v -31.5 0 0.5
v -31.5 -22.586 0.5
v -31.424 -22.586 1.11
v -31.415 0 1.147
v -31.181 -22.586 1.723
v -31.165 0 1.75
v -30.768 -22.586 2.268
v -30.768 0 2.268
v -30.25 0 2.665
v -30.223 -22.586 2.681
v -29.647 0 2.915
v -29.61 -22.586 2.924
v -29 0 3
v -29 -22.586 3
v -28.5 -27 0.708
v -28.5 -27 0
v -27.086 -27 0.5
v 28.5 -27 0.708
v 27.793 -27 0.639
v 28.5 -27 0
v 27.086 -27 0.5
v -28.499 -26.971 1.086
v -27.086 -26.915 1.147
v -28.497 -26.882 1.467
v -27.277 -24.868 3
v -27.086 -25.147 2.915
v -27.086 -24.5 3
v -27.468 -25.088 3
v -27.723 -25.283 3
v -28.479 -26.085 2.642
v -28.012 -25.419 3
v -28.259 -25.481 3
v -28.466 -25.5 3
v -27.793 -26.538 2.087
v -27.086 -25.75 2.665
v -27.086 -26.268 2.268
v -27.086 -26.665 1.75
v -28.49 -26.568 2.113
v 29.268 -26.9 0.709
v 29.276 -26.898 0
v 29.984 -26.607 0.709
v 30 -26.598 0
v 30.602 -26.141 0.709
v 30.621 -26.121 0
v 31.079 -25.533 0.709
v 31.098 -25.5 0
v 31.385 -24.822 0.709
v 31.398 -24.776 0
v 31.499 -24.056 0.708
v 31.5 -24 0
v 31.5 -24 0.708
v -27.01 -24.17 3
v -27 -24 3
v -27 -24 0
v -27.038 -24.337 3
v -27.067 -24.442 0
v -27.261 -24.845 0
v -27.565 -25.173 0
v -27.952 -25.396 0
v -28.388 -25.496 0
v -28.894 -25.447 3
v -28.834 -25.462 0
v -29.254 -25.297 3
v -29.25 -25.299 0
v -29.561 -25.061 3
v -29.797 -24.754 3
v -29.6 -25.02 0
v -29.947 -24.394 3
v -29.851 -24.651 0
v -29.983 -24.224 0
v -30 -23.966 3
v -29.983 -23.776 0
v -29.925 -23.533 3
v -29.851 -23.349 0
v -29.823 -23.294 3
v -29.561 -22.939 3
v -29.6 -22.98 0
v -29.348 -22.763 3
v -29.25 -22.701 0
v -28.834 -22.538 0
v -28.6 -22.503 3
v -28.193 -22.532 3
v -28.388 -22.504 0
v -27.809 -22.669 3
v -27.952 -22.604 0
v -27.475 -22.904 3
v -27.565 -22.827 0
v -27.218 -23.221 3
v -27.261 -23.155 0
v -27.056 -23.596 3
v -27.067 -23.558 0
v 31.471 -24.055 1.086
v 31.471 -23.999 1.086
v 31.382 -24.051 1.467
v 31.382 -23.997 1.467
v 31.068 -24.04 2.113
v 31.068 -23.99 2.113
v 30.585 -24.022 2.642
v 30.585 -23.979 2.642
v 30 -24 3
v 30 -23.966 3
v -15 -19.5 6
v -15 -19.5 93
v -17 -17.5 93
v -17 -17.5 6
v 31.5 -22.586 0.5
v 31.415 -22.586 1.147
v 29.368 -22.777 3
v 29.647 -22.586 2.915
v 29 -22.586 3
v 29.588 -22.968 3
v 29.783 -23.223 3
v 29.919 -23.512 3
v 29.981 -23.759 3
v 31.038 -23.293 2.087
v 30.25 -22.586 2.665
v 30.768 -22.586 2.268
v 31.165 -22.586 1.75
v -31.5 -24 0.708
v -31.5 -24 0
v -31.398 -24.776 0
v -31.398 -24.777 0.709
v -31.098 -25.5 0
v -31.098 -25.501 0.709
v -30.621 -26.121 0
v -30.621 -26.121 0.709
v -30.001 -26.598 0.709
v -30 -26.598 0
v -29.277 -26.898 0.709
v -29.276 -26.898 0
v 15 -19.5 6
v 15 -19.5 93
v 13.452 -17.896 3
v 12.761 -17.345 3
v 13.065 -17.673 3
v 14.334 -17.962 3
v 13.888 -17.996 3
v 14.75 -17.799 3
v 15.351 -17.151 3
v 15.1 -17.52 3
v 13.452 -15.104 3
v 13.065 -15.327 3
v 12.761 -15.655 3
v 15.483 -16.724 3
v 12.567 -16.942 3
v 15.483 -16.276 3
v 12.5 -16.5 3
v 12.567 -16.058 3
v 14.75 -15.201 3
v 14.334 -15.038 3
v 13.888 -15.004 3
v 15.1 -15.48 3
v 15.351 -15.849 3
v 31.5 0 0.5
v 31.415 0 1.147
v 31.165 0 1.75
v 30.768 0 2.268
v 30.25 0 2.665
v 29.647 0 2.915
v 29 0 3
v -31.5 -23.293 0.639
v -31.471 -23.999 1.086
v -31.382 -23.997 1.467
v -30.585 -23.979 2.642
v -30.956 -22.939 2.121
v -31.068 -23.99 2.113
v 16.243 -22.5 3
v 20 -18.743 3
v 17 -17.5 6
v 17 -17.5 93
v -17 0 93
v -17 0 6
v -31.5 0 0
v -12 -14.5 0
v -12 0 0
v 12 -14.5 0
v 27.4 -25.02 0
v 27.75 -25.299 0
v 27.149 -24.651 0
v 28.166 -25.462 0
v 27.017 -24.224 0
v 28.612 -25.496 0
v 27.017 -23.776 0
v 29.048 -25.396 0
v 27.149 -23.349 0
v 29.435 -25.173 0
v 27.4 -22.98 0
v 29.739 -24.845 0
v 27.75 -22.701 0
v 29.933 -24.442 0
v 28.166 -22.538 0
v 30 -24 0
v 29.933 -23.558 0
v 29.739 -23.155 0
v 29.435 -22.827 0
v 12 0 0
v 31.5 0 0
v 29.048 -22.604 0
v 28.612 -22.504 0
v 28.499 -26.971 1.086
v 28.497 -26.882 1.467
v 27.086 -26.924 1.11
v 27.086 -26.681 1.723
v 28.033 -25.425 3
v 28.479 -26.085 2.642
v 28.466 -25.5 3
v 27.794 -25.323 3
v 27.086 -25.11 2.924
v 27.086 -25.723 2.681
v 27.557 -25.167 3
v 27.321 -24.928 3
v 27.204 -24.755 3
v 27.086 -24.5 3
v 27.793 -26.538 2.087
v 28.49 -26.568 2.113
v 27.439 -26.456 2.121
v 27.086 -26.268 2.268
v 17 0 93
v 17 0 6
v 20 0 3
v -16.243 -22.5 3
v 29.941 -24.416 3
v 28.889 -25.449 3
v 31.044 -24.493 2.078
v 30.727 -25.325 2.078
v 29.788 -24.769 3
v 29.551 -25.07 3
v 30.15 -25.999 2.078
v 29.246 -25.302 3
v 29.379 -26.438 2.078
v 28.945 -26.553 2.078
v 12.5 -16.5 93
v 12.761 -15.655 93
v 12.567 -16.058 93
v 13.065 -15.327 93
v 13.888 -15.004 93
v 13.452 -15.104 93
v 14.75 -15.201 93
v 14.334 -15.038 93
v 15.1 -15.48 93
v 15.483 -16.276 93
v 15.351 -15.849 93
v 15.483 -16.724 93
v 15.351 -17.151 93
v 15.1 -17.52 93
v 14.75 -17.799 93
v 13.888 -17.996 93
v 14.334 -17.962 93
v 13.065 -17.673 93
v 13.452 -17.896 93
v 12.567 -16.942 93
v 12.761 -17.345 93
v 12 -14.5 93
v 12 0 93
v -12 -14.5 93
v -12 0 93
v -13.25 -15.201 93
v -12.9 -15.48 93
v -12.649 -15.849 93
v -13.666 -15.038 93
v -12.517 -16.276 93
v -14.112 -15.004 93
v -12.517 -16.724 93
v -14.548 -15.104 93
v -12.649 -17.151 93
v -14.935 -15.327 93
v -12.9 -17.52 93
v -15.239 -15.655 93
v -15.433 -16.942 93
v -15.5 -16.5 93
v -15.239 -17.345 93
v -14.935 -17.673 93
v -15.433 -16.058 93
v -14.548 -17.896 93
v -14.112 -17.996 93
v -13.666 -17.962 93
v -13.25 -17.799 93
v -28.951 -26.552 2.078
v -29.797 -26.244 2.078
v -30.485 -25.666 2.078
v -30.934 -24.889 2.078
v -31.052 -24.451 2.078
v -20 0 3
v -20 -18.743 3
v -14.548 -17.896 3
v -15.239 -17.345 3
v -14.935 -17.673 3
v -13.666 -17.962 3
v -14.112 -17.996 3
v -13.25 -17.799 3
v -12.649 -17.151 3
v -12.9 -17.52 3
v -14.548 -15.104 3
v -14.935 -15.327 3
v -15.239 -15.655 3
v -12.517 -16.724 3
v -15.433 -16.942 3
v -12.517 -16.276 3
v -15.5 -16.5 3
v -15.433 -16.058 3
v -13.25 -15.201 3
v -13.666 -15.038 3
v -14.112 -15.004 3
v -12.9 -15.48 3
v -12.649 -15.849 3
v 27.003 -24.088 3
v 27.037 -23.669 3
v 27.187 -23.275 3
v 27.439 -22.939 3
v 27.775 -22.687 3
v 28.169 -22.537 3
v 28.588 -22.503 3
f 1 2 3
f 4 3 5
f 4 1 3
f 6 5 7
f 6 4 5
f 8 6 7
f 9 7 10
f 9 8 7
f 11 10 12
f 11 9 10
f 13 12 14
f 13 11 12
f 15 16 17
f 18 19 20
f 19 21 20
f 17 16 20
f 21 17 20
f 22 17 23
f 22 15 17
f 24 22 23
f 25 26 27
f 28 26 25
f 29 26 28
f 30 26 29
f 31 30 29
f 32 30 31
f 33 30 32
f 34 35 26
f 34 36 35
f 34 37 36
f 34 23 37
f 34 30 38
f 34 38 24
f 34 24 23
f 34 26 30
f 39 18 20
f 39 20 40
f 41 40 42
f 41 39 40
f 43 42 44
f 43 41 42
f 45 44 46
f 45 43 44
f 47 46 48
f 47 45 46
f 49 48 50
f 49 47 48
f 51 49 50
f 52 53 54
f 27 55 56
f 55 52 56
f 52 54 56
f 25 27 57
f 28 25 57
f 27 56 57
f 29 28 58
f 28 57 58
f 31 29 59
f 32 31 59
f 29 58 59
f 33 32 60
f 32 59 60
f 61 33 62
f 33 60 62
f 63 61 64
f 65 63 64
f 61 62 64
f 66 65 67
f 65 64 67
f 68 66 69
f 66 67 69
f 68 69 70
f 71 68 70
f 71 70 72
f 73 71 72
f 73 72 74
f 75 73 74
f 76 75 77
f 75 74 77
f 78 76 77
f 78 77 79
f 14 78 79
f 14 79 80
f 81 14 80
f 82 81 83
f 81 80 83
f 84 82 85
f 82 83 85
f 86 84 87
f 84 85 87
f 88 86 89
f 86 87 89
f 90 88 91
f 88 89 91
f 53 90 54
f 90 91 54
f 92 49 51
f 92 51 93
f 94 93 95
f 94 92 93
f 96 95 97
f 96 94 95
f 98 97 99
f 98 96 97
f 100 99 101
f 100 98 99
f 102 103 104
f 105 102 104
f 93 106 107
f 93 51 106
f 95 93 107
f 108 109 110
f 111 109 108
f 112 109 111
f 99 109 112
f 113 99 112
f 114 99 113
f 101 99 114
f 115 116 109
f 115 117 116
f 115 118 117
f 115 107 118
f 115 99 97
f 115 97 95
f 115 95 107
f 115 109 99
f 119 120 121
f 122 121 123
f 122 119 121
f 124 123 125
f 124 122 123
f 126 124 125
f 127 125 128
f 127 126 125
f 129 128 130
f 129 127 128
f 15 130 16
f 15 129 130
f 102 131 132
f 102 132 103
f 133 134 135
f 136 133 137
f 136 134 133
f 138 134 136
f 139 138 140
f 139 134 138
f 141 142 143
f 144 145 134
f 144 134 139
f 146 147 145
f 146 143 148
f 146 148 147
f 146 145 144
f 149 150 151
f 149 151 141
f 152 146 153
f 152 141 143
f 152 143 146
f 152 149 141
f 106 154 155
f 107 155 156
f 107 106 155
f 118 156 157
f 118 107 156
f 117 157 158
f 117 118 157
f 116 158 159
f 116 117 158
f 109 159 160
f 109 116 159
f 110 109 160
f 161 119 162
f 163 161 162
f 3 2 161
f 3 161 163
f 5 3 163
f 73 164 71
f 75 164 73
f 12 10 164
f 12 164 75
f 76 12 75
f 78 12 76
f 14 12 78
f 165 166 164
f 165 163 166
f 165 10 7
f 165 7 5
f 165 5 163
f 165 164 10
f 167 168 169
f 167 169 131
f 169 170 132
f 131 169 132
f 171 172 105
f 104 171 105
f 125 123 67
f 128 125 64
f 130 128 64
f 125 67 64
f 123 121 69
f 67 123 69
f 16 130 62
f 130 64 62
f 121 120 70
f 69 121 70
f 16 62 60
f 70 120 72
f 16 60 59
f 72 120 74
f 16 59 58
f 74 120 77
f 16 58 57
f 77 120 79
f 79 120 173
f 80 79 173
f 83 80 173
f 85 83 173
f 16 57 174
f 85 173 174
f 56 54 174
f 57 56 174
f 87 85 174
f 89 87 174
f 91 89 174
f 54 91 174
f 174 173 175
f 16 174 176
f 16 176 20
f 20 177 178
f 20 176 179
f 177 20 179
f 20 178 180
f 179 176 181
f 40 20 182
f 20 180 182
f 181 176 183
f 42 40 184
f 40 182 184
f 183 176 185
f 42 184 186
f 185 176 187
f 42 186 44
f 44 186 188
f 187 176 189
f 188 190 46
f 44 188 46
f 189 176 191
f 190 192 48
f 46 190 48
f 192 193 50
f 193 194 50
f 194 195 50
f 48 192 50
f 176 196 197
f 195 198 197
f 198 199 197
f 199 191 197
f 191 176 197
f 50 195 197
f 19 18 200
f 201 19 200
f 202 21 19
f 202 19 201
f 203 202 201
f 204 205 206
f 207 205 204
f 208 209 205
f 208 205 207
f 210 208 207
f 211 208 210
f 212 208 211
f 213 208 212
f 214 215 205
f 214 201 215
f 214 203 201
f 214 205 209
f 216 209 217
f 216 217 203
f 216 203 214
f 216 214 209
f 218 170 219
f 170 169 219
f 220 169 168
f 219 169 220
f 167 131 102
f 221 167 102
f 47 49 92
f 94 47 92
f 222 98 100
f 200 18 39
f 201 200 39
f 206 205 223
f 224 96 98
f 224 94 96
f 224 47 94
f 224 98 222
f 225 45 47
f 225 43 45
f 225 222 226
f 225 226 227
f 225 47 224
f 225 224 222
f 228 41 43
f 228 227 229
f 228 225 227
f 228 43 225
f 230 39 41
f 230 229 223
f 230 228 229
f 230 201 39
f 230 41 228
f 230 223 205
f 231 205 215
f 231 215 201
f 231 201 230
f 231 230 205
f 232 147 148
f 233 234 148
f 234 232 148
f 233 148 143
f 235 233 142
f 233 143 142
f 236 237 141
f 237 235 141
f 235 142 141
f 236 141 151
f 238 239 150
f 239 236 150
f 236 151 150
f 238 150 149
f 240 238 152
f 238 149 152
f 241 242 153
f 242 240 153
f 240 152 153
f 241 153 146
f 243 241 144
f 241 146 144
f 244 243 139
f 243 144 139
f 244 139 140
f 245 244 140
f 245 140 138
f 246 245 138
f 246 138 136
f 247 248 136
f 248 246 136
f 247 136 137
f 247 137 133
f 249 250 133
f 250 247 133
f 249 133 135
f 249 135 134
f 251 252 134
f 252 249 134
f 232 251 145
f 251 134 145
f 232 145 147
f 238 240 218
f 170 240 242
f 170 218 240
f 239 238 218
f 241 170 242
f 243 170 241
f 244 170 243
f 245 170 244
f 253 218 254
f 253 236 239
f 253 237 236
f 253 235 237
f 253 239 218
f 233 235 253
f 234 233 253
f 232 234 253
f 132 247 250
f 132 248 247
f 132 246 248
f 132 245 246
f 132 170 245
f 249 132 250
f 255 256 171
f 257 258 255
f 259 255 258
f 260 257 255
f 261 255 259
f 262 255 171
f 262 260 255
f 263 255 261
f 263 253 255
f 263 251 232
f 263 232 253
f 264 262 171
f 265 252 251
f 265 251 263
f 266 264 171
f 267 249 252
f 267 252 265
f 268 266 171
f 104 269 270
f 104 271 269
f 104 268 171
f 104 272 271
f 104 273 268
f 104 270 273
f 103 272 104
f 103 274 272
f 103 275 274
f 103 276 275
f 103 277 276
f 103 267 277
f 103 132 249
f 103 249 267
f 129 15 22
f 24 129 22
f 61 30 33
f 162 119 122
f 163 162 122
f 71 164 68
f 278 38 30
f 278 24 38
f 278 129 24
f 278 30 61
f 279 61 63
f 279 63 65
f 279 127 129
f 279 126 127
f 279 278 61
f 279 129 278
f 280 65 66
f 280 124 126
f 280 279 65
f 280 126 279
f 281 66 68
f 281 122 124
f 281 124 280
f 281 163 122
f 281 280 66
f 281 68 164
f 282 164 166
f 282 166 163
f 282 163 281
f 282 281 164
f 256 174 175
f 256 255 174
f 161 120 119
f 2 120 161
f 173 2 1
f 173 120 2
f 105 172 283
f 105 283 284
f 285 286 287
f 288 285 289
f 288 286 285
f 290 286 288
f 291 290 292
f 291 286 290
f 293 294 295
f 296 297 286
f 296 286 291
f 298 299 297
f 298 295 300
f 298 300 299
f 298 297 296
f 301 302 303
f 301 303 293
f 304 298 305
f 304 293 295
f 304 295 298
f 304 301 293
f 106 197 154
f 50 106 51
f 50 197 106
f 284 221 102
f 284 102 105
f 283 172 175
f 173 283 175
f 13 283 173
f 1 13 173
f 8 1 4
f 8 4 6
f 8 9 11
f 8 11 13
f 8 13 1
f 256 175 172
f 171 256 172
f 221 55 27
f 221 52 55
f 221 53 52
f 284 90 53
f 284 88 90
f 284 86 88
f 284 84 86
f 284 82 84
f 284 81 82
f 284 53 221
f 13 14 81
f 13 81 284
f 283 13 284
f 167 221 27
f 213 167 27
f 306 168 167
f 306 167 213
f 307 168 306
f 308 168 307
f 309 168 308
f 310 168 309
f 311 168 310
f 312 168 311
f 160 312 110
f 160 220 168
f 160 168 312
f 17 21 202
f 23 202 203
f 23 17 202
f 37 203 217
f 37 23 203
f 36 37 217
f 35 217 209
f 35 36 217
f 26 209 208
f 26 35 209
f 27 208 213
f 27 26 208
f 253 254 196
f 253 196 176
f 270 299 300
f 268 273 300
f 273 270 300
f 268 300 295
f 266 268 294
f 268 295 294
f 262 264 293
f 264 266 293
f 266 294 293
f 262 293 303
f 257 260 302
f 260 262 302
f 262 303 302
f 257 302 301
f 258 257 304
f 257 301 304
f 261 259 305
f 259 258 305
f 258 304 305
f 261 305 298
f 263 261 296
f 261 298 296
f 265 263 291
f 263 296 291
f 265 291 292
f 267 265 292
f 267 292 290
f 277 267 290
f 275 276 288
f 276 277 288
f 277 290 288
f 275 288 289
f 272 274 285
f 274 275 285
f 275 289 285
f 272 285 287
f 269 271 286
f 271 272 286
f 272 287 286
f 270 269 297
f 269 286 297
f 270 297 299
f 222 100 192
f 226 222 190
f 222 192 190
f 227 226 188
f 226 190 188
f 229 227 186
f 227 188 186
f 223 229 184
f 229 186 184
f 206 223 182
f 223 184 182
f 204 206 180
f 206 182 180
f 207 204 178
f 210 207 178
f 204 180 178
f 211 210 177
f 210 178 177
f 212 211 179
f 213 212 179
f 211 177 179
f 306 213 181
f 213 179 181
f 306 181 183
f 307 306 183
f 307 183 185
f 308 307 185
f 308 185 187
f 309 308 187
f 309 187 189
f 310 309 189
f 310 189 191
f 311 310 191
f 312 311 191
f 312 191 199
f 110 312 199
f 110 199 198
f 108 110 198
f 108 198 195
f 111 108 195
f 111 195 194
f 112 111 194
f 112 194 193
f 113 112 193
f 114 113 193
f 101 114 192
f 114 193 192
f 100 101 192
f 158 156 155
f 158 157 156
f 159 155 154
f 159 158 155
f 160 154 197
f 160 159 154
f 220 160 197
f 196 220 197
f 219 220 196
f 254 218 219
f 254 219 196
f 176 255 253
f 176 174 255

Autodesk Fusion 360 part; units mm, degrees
sketch "Sketch1" plane through (0, 0, 0) normal (0, 0, 1) x (1, 0, 0)
  line L0 (-28.5, -24) -> (-28.5, 24)
  line L1 (-28.5, 24) -> (28.5, 24)
  line L2 (28.5, 24) -> (28.5, -24)
  line L3 (-28.5, -24) -> (28.5, -24)
  circle A0 centre (-28.5, 24) radius 1.5
  circle A1 centre (28.5, 24) radius 1.5
  circle A2 centre (-28.5, -24) radius 1.5
  circle A3 centre (28.5, -24) radius 1.5
  line L4 (0, 24) -> (0, -24)
  line L5 (0, 0) -> (-28.5, 0)
  line L6 (-31.5, -27) -> (31.5, -27)
  line L7 (31.5, 27) -> (31.5, -27)
  line L8 (-31.5, 27) -> (31.5, 27)
  line L9 (-31.5, -27) -> (-31.5, 27)
  dimension "d1" = 3
  dimension "d2" = 3
  dimension "d3" = 3
  dimension "d4" = 3
  dimension "d5" = -3
extrude "Extrude1" add sketch "Sketch1" along normal blind 3 contours L0 L3 A2 L4 L5 | L0 L1 A0 L4 L5 | L1 L2 L3 A1 A3 L4 | L6 L7 L8 L9
sketch "Sketch2" plane through (0, 0, 3) normal (0, 0, 1) x (-1, 0, 0)
  circle A0 centre (-28.5, -24) radius 1.5
  circle A1 centre (28.5, 24) radius 1.5
  circle A2 centre (28.5, -24) radius 1.5
  circle A3 centre (-28.5, 24) radius 1.5
  line L0 (31.5, 27) -> (-31.5, 27)
  line L1 (-31.5, 27) -> (-31.5, -27)
  line L2 (-31.5, -27) -> (31.5, -27)
  line L3 (31.5, -27) -> (31.5, 27)
  line L4 (-15, -19.5) -> (15, -19.5)
  line L5 (12, -14.5) -> (-12, -14.5)
  circle A4 centre (14, -16.5) radius 1.5
  line L6 (15, -19.5) -> (17, -17.5)
  line L7 (17, -17.5) -> (17, 0)
  line L8 (17, 0) -> (12, 0)
  line L9 (12, 0) -> (12, -14.5)
  line L10 (-12, -14.5) -> (-12, 0)
  line L11 (-12, 0) -> (-17, 0)
  line L12 (-17, 0) -> (-17, -17.5)
  line L13 (-17, -17.5) -> (-15, -19.5)
  circle A5 centre (-14, -16.5) radius 1.5
  line L14 (12, 0) -> (-12, 0)
  line L15 (0, 0) -> (0, -7.25)
  line L16 (12, 0) -> (12, 14.5)
  line L17 (17, 17.5) -> (17, 0)
  line L18 (17, 0) -> (12, 0)
  line L19 (-15, 19.5) -> (15, 19.5)
  line L20 (12, 14.5) -> (-12, 14.5)
  line L21 (-12, 14.5) -> (-12, 0)
  circle A6 centre (14, 16.5) radius 1.5
  circle A7 centre (-14, 16.5) radius 1.5
  line L22 (-17, 17.5) -> (-15, 19.5)
  line L23 (-17, 0) -> (-17, 17.5)
  line L24 (-12, 0) -> (-17, 0)
  line L25 (15, 19.5) -> (17, 17.5)
extrude "Extrude2" add sketch "Sketch2" along normal blind 90 contours L4 L5 L6 L7 L8 L9 L10 L11 L12 L13 L18 L24 | L8 L11 L16 L17 L18 L19 L20 L21 L22 L23 L24 L25
fillet "Fillet1" radius 3 4 edges at (-31.5, -27, 1.5) (31.5, -27, 1.5) (31.5, 27, 1.5) (-31.5, 27, 1.5)
fillet "Fillet2" radius 2.5 8 edges at (30.6213, 26.1213, 3) (0, 27, 3) (-30.6213, 26.1213, 3) (-31.5, 0, 3) (-30.6213, -26.1213, 3) (0, -27, 3) (30.6213, -26.1213, 3) (31.5, 0, 3)
chamfer "Chamfer1" distance 3 angle 45 8 edges at (0, 19.5, 3) (17, 0, 3) (16, 18.5, 3) (-16, 18.5, 3) (-16, -18.5, 3) (-17, 0, 3) (0, -19.5, 3) (16, -18.5, 3)
sketch "Sketch3" plane through (0, 19.5, 0) normal (0, 1, 0) x (-1, 0, 0)
  line L0 (15, 6) -> (15, 93)
  line L1 (15, 93) -> (-15, 93)
  line L2 (-15, 93) -> (-15, 6)
  line L3 (-15, 49.5) -> (15, 49.5)
  circle A0 centre (0, 49.5) radius 9.5
  line L4 (-15, 6) -> (15, 6)
  dimension "d12" = 19
extrude "Extrude3" cut sketch "Sketch3" against normal blind 6 contours L3 A0 | L3 A0
sketch "Sketch4" plane through (0, 0, 93) normal (0, 0, 1) x (-1, 0, 0)
  circle A0 centre (14, -16.5) radius 1.5
  circle A1 centre (14, 16.5) radius 1.5
  circle A2 centre (-14, -16.5) radius 1.5
  line L0 (12, 14.5) -> (12, -14.5)
  line L1 (12, -14.5) -> (-12, -14.5)
  line L2 (-12, -14.5) -> (-12, 14.5)
  line L3 (-12, 14.5) -> (12, 14.5)
  circle A3 centre (-14, 16.5) radius 1.5
  line L4 (-17, 17.5) -> (-17, -17.5)
  line L5 (-17, -17.5) -> (-15, -19.5)
  line L6 (-15, -19.5) -> (15, -19.5)
  line L7 (15, -19.5) -> (17, -17.5)
  line L8 (17, -17.5) -> (17, 17.5)
  line L9 (17, 17.5) -> (15, 19.5)
  line L10 (15, 19.5) -> (-15, 19.5)
  line L11 (-15, 19.5) -> (-17, 17.5)
  line L12 (-50, 0) -> (50, 0)
  line L13 (50, 0) -> (33.9234, 54.6299)
  line L14 (33.9234, 54.6299) -> (-46.2592, 44.9375)
  line L15 (-46.2592, 44.9375) -> (-50, 0)
  line L16 (12, 14.5) -> (-12, 14.5)
  line L17 (-12, 14.5) -> (-12, -14.5)
  line L18 (-12, -14.5) -> (12, -14.5)
  line L19 (12, -14.5) -> (12, 14.5)
  line L20 (-50, 0) -> (-64.2202, -68.1179)
  line L21 (-64.2202, -68.1179) -> (43.9074, -45.7813)
  line L22 (43.9074, -45.7813) -> (50, 0)
extrude "Extrude4" cut sketch "Sketch4" against normal blind 500 contours A0 | A2 | L0 L2 L3 L12 L16 L17 L19 | L0 L1 L2 L4 L5 L6 L7 L8 L12 L17 L18 L19 | L0 L1 L2 L12 L17 L18 L19 | L4 L5 L6 L7 L8 L12 L20 L21 L22
